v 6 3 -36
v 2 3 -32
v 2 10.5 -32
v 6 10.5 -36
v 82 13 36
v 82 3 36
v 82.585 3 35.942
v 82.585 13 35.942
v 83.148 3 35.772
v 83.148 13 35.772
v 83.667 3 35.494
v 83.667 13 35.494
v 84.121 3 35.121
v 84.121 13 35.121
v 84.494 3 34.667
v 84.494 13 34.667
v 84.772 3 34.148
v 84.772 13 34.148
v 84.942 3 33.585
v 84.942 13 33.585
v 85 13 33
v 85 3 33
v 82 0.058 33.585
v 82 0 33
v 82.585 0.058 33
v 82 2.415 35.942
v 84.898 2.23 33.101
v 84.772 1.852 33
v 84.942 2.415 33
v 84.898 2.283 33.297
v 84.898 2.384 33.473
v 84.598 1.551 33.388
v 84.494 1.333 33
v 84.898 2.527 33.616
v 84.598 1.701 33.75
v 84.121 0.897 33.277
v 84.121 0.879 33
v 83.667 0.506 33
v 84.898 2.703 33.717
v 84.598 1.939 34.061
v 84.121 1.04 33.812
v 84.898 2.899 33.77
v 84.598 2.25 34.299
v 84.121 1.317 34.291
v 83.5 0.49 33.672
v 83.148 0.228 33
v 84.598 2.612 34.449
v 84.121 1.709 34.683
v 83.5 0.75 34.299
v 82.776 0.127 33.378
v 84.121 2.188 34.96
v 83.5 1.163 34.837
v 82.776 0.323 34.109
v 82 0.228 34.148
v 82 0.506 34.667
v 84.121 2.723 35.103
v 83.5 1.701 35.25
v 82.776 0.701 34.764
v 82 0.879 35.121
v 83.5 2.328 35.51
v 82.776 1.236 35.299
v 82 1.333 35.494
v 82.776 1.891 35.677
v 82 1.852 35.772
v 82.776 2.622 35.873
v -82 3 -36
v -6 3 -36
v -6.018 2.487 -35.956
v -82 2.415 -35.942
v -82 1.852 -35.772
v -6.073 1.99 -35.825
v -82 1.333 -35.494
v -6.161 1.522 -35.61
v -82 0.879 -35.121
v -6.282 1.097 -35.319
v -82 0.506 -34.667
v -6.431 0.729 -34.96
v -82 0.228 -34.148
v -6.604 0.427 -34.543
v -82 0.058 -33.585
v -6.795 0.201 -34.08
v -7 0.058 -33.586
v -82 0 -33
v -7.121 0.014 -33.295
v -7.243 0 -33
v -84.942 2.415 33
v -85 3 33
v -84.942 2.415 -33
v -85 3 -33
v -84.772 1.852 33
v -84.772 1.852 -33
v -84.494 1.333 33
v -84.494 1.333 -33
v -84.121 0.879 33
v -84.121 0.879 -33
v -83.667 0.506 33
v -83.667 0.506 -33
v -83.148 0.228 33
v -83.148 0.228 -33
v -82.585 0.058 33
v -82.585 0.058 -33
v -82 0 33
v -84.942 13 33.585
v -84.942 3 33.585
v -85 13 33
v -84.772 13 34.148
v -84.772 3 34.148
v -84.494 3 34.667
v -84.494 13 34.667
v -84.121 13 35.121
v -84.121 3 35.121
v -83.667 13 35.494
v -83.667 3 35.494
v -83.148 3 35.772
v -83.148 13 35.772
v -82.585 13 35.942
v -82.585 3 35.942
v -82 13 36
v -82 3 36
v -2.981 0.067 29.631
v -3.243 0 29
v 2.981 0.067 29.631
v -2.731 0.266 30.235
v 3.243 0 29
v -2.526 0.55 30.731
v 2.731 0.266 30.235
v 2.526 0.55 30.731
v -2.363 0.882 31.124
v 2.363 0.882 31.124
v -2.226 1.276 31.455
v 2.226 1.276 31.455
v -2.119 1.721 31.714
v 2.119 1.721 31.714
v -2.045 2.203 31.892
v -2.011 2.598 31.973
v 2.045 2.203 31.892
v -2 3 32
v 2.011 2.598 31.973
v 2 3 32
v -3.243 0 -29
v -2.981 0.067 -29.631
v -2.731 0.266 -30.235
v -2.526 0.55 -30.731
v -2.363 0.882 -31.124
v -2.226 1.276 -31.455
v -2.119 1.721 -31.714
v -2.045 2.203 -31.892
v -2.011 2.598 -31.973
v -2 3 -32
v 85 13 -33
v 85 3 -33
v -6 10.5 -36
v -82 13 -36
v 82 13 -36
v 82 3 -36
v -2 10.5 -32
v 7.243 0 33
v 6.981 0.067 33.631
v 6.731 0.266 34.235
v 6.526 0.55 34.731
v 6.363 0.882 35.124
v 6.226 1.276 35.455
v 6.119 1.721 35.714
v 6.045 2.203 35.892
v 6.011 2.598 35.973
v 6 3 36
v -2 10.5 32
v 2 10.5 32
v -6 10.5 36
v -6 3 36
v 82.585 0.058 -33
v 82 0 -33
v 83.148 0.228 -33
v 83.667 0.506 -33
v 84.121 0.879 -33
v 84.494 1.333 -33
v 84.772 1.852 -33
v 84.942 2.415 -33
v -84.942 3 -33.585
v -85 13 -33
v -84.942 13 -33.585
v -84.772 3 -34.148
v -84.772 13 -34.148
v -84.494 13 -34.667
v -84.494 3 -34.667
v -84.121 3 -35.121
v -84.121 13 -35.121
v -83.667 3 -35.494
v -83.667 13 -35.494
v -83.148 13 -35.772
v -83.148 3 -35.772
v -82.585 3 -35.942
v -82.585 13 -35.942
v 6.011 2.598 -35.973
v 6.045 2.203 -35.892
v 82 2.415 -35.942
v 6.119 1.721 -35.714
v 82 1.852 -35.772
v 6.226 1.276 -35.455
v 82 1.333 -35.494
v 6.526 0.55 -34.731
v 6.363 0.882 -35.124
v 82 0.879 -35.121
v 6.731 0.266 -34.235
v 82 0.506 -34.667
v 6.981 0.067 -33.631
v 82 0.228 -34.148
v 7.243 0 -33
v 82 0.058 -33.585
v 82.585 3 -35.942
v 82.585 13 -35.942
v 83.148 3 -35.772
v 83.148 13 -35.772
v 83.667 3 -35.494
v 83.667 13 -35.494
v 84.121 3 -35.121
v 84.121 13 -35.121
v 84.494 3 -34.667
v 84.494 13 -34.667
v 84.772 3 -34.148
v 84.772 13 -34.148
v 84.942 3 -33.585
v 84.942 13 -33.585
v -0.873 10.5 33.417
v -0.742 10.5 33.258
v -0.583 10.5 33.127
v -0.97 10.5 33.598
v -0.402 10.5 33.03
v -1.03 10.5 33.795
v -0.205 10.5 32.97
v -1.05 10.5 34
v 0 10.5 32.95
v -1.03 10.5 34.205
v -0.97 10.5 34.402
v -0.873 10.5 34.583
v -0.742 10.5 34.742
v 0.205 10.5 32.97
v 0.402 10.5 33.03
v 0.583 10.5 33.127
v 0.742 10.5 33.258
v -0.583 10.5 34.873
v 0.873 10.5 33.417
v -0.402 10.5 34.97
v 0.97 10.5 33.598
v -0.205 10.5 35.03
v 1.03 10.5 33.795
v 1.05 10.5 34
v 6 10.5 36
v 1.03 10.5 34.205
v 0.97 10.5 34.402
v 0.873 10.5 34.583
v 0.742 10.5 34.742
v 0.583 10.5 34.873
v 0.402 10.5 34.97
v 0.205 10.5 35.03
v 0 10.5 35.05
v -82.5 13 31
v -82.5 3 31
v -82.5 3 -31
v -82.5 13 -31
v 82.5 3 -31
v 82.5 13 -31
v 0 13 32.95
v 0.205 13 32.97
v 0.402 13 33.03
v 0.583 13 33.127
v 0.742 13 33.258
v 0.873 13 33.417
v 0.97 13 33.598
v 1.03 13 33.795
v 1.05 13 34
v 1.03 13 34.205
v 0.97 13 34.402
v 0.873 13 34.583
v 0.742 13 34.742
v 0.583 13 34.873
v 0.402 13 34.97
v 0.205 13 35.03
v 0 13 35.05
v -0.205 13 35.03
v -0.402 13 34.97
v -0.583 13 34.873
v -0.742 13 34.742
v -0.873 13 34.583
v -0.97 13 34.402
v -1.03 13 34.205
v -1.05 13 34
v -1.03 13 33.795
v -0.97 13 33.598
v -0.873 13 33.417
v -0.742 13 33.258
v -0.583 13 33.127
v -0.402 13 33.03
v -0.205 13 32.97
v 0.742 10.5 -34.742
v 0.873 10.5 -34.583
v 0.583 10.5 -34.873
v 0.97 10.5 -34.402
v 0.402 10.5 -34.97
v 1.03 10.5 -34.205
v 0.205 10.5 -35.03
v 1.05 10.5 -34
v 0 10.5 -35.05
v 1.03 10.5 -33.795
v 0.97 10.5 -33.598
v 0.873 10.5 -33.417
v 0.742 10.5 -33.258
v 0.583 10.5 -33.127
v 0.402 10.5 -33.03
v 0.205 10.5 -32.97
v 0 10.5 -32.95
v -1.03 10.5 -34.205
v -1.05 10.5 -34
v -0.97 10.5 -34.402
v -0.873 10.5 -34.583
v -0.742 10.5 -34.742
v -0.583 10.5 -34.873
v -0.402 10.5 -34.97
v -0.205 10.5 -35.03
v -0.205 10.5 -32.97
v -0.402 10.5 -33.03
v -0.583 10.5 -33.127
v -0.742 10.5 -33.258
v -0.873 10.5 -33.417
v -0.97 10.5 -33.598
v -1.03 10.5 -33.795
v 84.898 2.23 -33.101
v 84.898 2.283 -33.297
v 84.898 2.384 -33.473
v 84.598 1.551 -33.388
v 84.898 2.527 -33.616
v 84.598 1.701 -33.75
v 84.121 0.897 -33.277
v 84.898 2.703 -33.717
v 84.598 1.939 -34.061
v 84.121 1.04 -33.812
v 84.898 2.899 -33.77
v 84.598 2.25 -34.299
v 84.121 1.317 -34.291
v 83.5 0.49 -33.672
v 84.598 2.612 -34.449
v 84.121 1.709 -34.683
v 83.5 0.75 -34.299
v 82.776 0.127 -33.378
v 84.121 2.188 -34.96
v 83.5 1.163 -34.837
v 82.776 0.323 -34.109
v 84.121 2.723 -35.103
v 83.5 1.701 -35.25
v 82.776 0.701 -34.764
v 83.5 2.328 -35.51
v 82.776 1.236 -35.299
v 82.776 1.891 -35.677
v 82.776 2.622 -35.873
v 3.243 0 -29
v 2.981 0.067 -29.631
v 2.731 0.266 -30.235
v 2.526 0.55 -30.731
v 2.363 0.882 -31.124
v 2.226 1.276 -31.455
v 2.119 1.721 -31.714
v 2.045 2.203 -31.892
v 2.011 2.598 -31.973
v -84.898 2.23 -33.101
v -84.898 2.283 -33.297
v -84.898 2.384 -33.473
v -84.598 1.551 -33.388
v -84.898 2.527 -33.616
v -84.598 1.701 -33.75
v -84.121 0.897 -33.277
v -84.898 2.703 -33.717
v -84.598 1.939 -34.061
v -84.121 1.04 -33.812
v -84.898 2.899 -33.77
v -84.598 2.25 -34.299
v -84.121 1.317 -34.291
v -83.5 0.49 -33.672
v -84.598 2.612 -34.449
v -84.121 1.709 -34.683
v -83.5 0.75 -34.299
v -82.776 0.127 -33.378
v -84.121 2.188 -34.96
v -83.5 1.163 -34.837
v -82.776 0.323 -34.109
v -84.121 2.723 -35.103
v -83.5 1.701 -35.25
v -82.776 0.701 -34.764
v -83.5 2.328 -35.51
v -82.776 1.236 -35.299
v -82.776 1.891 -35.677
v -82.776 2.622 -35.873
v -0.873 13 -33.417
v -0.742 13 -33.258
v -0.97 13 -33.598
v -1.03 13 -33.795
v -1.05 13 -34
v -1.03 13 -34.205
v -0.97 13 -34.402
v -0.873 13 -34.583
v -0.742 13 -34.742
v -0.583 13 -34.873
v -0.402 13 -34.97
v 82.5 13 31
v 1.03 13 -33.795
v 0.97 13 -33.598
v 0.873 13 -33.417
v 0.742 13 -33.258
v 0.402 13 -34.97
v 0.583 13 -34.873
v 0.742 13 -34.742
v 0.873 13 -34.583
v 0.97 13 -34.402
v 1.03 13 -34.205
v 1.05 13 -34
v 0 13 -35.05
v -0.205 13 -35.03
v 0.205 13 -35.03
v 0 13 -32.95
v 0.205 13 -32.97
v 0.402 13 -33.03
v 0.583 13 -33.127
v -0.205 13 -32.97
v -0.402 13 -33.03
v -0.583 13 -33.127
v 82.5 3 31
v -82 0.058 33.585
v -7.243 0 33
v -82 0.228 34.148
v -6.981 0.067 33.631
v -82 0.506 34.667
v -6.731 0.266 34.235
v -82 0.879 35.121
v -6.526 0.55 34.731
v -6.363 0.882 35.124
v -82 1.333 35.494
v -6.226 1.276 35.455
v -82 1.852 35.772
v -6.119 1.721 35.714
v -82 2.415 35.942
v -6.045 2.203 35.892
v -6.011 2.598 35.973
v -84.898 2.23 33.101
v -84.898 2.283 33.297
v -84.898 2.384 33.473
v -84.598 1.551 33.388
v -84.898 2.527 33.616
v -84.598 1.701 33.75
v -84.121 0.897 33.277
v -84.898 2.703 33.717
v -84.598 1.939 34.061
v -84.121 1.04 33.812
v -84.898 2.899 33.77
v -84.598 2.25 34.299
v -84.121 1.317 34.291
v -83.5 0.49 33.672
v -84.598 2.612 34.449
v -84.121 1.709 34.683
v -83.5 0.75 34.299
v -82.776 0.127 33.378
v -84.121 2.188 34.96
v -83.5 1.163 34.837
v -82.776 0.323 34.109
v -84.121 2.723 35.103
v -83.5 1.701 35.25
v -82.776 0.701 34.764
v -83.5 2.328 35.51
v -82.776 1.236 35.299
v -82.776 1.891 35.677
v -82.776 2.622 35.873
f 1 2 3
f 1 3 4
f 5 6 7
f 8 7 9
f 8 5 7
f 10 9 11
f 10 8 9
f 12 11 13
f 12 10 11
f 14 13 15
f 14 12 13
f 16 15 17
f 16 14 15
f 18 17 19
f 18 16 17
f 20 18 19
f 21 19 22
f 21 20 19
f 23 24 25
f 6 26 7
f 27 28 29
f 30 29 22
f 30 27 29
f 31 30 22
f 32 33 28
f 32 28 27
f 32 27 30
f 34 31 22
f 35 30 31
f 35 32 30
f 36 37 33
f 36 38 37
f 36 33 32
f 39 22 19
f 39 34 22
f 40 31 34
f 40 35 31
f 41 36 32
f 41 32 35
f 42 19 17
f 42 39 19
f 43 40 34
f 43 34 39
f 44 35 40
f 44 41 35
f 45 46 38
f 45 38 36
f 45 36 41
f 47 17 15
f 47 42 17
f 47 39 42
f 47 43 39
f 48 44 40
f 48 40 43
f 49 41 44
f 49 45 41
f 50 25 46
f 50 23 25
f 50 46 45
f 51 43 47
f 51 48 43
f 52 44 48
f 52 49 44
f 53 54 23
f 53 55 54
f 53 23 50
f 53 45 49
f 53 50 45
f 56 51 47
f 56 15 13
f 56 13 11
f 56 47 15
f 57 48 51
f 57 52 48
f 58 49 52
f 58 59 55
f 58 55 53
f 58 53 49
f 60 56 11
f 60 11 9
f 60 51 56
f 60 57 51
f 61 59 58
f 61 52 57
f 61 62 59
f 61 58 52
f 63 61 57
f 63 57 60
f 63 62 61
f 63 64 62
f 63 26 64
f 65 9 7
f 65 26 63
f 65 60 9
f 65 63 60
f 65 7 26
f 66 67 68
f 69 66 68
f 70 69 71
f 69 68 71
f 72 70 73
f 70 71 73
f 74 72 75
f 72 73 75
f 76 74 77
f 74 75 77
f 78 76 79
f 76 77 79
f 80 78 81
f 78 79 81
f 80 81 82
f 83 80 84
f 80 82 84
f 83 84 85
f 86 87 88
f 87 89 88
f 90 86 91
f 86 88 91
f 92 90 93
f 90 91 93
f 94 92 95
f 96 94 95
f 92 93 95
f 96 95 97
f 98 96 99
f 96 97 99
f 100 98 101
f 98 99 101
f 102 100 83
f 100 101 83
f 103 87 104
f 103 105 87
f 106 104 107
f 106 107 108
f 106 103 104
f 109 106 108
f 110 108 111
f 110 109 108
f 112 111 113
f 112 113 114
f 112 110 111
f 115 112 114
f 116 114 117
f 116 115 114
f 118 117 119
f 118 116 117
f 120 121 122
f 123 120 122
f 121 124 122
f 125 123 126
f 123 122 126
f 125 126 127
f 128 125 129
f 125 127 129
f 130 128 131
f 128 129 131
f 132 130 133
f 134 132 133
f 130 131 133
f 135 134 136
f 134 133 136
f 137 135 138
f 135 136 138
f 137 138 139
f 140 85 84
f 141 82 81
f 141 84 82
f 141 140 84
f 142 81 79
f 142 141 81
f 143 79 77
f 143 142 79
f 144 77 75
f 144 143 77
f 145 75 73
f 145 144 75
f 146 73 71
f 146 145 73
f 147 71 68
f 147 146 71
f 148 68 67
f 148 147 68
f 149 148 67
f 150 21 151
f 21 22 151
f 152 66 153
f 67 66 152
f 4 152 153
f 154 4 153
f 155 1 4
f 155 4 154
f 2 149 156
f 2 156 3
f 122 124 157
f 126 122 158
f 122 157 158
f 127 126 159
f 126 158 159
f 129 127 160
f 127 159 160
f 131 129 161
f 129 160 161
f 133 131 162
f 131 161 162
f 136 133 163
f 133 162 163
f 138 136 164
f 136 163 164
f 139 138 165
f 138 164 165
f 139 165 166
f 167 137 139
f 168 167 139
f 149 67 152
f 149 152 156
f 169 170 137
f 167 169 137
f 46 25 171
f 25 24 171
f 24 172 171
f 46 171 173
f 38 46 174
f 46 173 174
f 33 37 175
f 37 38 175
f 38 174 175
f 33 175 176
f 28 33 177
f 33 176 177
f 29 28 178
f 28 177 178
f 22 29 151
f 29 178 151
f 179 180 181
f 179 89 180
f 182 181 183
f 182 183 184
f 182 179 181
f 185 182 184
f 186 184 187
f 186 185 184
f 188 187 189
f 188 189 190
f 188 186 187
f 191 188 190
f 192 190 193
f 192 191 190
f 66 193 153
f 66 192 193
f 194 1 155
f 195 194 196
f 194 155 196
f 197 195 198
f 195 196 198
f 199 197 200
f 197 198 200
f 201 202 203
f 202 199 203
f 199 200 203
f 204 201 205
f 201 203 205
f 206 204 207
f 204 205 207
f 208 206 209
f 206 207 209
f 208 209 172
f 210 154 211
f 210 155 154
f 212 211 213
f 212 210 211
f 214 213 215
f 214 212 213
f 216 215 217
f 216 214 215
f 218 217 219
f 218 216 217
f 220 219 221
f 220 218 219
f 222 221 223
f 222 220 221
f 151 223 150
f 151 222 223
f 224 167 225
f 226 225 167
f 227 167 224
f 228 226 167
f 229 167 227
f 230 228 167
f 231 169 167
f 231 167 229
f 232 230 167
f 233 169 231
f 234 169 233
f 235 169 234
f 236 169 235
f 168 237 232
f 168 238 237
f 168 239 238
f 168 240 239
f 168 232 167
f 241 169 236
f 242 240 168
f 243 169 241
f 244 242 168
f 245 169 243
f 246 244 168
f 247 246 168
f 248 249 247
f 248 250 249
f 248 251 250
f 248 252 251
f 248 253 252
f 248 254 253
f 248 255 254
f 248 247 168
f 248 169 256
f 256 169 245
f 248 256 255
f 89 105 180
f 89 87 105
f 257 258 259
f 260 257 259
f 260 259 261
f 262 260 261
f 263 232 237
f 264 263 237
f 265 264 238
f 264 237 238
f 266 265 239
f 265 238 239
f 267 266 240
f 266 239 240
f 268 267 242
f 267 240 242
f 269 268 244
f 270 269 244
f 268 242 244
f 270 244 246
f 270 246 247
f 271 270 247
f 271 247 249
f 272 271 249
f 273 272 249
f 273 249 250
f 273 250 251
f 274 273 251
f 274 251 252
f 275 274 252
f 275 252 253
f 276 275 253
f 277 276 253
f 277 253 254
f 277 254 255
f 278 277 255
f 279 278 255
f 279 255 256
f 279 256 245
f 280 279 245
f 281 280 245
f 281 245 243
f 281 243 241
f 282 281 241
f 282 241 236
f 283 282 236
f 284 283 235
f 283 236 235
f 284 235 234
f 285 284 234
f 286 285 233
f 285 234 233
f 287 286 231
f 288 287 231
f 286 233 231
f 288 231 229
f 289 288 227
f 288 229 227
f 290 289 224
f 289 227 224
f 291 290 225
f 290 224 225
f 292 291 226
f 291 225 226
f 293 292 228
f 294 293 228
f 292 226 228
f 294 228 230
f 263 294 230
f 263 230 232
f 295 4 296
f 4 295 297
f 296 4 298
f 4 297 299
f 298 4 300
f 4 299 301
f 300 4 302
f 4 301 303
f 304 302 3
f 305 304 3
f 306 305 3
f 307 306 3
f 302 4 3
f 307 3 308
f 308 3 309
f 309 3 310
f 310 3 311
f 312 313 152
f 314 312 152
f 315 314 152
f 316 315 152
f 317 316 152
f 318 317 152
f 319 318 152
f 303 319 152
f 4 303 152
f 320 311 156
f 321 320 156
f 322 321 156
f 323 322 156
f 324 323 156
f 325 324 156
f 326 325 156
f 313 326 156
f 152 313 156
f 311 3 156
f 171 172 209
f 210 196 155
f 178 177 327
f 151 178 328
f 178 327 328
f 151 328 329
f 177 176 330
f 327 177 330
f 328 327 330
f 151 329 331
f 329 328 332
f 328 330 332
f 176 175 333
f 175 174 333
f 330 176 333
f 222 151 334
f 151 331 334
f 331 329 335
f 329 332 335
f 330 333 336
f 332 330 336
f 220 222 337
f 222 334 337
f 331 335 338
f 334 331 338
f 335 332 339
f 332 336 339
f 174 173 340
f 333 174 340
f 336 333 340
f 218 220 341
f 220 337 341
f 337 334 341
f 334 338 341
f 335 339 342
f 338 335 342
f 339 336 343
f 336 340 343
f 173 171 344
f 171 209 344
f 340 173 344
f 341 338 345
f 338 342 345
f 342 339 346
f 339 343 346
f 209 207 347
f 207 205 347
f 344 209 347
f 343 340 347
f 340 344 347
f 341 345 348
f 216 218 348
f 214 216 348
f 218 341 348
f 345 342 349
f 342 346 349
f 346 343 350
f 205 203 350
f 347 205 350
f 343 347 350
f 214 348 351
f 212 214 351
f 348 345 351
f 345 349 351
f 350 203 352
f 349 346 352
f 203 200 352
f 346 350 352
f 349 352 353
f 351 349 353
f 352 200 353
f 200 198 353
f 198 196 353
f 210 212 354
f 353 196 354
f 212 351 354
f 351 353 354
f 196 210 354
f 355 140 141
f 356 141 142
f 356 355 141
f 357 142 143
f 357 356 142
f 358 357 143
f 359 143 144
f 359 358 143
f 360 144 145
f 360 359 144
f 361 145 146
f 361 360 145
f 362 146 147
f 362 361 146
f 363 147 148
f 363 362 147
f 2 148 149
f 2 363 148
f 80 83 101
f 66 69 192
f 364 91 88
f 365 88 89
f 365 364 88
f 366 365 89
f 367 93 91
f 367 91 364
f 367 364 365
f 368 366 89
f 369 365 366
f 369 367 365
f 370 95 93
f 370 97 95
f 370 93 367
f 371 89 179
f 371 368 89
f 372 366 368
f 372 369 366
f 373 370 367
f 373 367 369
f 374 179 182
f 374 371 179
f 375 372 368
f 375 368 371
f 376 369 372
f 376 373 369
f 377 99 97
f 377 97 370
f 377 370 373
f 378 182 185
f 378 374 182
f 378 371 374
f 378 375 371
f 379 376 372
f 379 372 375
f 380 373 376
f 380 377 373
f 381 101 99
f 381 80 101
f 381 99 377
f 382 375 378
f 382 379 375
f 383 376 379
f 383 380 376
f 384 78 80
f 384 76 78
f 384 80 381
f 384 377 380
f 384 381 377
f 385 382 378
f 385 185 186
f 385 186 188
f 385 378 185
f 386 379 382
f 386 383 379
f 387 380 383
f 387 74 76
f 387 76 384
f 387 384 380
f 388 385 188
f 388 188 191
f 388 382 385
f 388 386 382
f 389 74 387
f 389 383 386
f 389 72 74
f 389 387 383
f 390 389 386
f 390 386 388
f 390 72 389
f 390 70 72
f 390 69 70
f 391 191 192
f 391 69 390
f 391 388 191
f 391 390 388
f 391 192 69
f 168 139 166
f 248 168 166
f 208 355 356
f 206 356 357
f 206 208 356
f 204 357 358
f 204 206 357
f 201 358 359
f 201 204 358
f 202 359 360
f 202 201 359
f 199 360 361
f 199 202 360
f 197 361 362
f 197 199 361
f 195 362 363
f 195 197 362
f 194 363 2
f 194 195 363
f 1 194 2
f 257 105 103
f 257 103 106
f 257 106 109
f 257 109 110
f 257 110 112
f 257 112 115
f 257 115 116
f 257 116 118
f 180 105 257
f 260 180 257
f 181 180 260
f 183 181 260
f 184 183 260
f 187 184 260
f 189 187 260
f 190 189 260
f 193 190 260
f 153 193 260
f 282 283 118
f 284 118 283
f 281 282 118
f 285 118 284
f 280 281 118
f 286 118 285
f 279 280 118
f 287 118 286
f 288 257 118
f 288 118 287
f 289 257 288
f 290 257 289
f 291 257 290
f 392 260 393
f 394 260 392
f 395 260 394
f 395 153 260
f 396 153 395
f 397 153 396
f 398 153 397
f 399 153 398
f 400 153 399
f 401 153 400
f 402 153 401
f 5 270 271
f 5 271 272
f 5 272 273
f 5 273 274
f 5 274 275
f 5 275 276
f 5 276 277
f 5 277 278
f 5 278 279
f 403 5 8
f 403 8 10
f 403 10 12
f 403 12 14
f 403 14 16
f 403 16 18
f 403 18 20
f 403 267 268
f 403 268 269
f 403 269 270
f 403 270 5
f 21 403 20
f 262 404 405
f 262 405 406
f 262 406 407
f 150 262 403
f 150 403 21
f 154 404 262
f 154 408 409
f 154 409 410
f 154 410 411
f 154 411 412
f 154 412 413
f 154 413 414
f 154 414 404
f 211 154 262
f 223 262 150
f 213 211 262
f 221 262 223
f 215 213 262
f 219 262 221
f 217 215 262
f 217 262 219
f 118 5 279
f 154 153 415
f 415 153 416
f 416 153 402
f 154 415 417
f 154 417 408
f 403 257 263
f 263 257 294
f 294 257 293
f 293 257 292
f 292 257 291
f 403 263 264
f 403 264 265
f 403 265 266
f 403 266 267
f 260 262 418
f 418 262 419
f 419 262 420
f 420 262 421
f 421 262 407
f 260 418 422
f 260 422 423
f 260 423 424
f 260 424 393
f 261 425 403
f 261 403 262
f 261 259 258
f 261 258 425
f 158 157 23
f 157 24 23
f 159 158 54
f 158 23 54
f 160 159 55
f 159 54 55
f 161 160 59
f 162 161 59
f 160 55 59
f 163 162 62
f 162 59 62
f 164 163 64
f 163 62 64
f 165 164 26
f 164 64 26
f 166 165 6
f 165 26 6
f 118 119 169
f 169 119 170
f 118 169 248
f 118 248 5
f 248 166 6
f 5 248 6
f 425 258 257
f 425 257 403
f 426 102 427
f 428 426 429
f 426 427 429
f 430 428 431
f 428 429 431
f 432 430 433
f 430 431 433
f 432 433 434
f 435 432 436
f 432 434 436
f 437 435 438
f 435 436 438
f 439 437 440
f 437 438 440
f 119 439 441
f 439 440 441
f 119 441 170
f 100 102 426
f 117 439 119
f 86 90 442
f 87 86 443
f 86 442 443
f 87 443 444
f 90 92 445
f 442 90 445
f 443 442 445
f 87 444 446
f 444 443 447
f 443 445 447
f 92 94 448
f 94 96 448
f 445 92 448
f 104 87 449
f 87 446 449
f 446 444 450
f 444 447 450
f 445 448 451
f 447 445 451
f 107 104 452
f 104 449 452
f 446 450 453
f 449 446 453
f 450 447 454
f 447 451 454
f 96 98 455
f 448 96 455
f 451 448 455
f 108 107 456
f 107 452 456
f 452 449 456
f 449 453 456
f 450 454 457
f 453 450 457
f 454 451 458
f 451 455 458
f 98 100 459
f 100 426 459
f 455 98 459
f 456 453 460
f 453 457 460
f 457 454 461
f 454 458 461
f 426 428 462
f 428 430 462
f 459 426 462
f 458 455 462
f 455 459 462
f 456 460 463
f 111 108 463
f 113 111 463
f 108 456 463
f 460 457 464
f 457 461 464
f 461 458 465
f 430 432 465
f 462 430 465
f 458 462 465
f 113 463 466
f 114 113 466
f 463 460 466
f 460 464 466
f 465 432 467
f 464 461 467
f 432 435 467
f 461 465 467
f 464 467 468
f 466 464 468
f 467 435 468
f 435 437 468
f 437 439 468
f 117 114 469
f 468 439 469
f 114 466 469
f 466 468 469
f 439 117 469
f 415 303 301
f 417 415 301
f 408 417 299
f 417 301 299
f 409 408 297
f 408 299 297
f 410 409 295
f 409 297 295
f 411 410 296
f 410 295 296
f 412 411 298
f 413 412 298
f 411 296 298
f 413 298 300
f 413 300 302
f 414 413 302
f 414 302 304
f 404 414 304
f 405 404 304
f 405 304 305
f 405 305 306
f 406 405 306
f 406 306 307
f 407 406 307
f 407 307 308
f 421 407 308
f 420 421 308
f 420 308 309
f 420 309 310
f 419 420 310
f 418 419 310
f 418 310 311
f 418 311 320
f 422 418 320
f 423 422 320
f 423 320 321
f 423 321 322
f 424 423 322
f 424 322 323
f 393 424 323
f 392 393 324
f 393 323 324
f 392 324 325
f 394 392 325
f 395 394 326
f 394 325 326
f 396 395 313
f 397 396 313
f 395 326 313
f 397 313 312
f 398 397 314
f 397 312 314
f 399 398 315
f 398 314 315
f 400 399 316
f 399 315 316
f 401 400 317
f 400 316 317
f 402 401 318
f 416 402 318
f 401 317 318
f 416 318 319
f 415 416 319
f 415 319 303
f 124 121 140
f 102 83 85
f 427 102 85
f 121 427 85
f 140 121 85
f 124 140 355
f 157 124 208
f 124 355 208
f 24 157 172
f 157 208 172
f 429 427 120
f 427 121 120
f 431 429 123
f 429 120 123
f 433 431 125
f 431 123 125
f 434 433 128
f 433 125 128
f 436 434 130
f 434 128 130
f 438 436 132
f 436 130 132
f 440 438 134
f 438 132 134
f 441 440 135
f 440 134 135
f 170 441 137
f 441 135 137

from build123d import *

# Parameters (mm, degrees)
SKETCH_1_W          = 170
SKETCH_1_H          = 72
EXTRUDE_1_DEPTH     = 3
SKETCH_2_W          = 170
SKETCH_2_H          = 72
SKETCH_2_W_2        = 165
SKETCH_2_H_2        = 62
EXTRUDE_2_DEPTH     = 10
CUT_EXTRUDE_1_DEPTH = 10.5
SKETCH_5_R          = 1.05
CUT_EXTRUDE_2_DEPTH = 10.5
SKETCH_6_R          = 1.05
CUT_EXTRUDE_3_DEPTH = 10.5
FILLET_1_R          = 3


with BuildPart() as part:
    # 草图1 → 凸台-拉伸1 (new body)
    with BuildSketch(Plane(origin=(0, 0, 0), x_dir=(1, 0, 0), z_dir=(0, 1, 0))):
        Rectangle(SKETCH_1_W, SKETCH_1_H)
    extrude(amount=EXTRUDE_1_DEPTH)

    # 草图2 → 凸台-拉伸2 (add)
    with BuildSketch(Plane(origin=(0, 3, 0), x_dir=(1, 0, 0), z_dir=(0, 1, 0))):
        Rectangle(SKETCH_2_W, SKETCH_2_H)
        Rectangle(SKETCH_2_W_2, SKETCH_2_H_2, mode=Mode.SUBTRACT)
    extrude(amount=EXTRUDE_2_DEPTH)

    # 草图3 → 切除-拉伸1 (cut)
    with BuildSketch(Plane.XZ):
        Polygon((-6, 36), (-2, 32), (2, 32), (6, 36), align=None)
        Polygon((6, -36), (-6, -36), (-2, -32), (2, -32), align=None)
    extrude(amount=-CUT_EXTRUDE_1_DEPTH, mode=Mode.SUBTRACT)

    # 草图5 → 切除-拉伸2 (cut)
    with BuildSketch(Plane.XZ.offset(-10.5)):
        with Locations(Location((0, 34, 0), (0, 0, 270))):
            Circle(SKETCH_5_R)
    extrude(amount=-CUT_EXTRUDE_2_DEPTH, mode=Mode.SUBTRACT)

    # 草图6 → 切除-拉伸3 (cut)
    with BuildSketch(Plane.XZ.offset(-10.5)):
        with Locations(Location((0, -34, 0), (0, 0, 270))):
            Circle(SKETCH_6_R)
    extrude(amount=-CUT_EXTRUDE_3_DEPTH, mode=Mode.SUBTRACT)

    # 圆角1
    fillet_1_edges = [part.edges().sort_by_distance(p)[0] for p in [
        (45.5, 0, 36),
        (-45.5, 0, -36),
        (-4, 0, 34),
        (0, 0, 32),
        (4, 0, 34),
        (-45.5, 0, 36),
        (4, 0, -34),
        (0, 0, -32),
        (-85, 0, 0),
        (-4, 0, -34),
        (45.5, 0, -36),
        (85, 0, 0),
        (85, 6.5, 36),
        (-85, 6.5, 36),
        (-85, 6.5, -36),
        (85, 6.5, -36),
    ]]
    fillet(fillet_1_edges, radius=FILLET_1_R)


solid = part.part
